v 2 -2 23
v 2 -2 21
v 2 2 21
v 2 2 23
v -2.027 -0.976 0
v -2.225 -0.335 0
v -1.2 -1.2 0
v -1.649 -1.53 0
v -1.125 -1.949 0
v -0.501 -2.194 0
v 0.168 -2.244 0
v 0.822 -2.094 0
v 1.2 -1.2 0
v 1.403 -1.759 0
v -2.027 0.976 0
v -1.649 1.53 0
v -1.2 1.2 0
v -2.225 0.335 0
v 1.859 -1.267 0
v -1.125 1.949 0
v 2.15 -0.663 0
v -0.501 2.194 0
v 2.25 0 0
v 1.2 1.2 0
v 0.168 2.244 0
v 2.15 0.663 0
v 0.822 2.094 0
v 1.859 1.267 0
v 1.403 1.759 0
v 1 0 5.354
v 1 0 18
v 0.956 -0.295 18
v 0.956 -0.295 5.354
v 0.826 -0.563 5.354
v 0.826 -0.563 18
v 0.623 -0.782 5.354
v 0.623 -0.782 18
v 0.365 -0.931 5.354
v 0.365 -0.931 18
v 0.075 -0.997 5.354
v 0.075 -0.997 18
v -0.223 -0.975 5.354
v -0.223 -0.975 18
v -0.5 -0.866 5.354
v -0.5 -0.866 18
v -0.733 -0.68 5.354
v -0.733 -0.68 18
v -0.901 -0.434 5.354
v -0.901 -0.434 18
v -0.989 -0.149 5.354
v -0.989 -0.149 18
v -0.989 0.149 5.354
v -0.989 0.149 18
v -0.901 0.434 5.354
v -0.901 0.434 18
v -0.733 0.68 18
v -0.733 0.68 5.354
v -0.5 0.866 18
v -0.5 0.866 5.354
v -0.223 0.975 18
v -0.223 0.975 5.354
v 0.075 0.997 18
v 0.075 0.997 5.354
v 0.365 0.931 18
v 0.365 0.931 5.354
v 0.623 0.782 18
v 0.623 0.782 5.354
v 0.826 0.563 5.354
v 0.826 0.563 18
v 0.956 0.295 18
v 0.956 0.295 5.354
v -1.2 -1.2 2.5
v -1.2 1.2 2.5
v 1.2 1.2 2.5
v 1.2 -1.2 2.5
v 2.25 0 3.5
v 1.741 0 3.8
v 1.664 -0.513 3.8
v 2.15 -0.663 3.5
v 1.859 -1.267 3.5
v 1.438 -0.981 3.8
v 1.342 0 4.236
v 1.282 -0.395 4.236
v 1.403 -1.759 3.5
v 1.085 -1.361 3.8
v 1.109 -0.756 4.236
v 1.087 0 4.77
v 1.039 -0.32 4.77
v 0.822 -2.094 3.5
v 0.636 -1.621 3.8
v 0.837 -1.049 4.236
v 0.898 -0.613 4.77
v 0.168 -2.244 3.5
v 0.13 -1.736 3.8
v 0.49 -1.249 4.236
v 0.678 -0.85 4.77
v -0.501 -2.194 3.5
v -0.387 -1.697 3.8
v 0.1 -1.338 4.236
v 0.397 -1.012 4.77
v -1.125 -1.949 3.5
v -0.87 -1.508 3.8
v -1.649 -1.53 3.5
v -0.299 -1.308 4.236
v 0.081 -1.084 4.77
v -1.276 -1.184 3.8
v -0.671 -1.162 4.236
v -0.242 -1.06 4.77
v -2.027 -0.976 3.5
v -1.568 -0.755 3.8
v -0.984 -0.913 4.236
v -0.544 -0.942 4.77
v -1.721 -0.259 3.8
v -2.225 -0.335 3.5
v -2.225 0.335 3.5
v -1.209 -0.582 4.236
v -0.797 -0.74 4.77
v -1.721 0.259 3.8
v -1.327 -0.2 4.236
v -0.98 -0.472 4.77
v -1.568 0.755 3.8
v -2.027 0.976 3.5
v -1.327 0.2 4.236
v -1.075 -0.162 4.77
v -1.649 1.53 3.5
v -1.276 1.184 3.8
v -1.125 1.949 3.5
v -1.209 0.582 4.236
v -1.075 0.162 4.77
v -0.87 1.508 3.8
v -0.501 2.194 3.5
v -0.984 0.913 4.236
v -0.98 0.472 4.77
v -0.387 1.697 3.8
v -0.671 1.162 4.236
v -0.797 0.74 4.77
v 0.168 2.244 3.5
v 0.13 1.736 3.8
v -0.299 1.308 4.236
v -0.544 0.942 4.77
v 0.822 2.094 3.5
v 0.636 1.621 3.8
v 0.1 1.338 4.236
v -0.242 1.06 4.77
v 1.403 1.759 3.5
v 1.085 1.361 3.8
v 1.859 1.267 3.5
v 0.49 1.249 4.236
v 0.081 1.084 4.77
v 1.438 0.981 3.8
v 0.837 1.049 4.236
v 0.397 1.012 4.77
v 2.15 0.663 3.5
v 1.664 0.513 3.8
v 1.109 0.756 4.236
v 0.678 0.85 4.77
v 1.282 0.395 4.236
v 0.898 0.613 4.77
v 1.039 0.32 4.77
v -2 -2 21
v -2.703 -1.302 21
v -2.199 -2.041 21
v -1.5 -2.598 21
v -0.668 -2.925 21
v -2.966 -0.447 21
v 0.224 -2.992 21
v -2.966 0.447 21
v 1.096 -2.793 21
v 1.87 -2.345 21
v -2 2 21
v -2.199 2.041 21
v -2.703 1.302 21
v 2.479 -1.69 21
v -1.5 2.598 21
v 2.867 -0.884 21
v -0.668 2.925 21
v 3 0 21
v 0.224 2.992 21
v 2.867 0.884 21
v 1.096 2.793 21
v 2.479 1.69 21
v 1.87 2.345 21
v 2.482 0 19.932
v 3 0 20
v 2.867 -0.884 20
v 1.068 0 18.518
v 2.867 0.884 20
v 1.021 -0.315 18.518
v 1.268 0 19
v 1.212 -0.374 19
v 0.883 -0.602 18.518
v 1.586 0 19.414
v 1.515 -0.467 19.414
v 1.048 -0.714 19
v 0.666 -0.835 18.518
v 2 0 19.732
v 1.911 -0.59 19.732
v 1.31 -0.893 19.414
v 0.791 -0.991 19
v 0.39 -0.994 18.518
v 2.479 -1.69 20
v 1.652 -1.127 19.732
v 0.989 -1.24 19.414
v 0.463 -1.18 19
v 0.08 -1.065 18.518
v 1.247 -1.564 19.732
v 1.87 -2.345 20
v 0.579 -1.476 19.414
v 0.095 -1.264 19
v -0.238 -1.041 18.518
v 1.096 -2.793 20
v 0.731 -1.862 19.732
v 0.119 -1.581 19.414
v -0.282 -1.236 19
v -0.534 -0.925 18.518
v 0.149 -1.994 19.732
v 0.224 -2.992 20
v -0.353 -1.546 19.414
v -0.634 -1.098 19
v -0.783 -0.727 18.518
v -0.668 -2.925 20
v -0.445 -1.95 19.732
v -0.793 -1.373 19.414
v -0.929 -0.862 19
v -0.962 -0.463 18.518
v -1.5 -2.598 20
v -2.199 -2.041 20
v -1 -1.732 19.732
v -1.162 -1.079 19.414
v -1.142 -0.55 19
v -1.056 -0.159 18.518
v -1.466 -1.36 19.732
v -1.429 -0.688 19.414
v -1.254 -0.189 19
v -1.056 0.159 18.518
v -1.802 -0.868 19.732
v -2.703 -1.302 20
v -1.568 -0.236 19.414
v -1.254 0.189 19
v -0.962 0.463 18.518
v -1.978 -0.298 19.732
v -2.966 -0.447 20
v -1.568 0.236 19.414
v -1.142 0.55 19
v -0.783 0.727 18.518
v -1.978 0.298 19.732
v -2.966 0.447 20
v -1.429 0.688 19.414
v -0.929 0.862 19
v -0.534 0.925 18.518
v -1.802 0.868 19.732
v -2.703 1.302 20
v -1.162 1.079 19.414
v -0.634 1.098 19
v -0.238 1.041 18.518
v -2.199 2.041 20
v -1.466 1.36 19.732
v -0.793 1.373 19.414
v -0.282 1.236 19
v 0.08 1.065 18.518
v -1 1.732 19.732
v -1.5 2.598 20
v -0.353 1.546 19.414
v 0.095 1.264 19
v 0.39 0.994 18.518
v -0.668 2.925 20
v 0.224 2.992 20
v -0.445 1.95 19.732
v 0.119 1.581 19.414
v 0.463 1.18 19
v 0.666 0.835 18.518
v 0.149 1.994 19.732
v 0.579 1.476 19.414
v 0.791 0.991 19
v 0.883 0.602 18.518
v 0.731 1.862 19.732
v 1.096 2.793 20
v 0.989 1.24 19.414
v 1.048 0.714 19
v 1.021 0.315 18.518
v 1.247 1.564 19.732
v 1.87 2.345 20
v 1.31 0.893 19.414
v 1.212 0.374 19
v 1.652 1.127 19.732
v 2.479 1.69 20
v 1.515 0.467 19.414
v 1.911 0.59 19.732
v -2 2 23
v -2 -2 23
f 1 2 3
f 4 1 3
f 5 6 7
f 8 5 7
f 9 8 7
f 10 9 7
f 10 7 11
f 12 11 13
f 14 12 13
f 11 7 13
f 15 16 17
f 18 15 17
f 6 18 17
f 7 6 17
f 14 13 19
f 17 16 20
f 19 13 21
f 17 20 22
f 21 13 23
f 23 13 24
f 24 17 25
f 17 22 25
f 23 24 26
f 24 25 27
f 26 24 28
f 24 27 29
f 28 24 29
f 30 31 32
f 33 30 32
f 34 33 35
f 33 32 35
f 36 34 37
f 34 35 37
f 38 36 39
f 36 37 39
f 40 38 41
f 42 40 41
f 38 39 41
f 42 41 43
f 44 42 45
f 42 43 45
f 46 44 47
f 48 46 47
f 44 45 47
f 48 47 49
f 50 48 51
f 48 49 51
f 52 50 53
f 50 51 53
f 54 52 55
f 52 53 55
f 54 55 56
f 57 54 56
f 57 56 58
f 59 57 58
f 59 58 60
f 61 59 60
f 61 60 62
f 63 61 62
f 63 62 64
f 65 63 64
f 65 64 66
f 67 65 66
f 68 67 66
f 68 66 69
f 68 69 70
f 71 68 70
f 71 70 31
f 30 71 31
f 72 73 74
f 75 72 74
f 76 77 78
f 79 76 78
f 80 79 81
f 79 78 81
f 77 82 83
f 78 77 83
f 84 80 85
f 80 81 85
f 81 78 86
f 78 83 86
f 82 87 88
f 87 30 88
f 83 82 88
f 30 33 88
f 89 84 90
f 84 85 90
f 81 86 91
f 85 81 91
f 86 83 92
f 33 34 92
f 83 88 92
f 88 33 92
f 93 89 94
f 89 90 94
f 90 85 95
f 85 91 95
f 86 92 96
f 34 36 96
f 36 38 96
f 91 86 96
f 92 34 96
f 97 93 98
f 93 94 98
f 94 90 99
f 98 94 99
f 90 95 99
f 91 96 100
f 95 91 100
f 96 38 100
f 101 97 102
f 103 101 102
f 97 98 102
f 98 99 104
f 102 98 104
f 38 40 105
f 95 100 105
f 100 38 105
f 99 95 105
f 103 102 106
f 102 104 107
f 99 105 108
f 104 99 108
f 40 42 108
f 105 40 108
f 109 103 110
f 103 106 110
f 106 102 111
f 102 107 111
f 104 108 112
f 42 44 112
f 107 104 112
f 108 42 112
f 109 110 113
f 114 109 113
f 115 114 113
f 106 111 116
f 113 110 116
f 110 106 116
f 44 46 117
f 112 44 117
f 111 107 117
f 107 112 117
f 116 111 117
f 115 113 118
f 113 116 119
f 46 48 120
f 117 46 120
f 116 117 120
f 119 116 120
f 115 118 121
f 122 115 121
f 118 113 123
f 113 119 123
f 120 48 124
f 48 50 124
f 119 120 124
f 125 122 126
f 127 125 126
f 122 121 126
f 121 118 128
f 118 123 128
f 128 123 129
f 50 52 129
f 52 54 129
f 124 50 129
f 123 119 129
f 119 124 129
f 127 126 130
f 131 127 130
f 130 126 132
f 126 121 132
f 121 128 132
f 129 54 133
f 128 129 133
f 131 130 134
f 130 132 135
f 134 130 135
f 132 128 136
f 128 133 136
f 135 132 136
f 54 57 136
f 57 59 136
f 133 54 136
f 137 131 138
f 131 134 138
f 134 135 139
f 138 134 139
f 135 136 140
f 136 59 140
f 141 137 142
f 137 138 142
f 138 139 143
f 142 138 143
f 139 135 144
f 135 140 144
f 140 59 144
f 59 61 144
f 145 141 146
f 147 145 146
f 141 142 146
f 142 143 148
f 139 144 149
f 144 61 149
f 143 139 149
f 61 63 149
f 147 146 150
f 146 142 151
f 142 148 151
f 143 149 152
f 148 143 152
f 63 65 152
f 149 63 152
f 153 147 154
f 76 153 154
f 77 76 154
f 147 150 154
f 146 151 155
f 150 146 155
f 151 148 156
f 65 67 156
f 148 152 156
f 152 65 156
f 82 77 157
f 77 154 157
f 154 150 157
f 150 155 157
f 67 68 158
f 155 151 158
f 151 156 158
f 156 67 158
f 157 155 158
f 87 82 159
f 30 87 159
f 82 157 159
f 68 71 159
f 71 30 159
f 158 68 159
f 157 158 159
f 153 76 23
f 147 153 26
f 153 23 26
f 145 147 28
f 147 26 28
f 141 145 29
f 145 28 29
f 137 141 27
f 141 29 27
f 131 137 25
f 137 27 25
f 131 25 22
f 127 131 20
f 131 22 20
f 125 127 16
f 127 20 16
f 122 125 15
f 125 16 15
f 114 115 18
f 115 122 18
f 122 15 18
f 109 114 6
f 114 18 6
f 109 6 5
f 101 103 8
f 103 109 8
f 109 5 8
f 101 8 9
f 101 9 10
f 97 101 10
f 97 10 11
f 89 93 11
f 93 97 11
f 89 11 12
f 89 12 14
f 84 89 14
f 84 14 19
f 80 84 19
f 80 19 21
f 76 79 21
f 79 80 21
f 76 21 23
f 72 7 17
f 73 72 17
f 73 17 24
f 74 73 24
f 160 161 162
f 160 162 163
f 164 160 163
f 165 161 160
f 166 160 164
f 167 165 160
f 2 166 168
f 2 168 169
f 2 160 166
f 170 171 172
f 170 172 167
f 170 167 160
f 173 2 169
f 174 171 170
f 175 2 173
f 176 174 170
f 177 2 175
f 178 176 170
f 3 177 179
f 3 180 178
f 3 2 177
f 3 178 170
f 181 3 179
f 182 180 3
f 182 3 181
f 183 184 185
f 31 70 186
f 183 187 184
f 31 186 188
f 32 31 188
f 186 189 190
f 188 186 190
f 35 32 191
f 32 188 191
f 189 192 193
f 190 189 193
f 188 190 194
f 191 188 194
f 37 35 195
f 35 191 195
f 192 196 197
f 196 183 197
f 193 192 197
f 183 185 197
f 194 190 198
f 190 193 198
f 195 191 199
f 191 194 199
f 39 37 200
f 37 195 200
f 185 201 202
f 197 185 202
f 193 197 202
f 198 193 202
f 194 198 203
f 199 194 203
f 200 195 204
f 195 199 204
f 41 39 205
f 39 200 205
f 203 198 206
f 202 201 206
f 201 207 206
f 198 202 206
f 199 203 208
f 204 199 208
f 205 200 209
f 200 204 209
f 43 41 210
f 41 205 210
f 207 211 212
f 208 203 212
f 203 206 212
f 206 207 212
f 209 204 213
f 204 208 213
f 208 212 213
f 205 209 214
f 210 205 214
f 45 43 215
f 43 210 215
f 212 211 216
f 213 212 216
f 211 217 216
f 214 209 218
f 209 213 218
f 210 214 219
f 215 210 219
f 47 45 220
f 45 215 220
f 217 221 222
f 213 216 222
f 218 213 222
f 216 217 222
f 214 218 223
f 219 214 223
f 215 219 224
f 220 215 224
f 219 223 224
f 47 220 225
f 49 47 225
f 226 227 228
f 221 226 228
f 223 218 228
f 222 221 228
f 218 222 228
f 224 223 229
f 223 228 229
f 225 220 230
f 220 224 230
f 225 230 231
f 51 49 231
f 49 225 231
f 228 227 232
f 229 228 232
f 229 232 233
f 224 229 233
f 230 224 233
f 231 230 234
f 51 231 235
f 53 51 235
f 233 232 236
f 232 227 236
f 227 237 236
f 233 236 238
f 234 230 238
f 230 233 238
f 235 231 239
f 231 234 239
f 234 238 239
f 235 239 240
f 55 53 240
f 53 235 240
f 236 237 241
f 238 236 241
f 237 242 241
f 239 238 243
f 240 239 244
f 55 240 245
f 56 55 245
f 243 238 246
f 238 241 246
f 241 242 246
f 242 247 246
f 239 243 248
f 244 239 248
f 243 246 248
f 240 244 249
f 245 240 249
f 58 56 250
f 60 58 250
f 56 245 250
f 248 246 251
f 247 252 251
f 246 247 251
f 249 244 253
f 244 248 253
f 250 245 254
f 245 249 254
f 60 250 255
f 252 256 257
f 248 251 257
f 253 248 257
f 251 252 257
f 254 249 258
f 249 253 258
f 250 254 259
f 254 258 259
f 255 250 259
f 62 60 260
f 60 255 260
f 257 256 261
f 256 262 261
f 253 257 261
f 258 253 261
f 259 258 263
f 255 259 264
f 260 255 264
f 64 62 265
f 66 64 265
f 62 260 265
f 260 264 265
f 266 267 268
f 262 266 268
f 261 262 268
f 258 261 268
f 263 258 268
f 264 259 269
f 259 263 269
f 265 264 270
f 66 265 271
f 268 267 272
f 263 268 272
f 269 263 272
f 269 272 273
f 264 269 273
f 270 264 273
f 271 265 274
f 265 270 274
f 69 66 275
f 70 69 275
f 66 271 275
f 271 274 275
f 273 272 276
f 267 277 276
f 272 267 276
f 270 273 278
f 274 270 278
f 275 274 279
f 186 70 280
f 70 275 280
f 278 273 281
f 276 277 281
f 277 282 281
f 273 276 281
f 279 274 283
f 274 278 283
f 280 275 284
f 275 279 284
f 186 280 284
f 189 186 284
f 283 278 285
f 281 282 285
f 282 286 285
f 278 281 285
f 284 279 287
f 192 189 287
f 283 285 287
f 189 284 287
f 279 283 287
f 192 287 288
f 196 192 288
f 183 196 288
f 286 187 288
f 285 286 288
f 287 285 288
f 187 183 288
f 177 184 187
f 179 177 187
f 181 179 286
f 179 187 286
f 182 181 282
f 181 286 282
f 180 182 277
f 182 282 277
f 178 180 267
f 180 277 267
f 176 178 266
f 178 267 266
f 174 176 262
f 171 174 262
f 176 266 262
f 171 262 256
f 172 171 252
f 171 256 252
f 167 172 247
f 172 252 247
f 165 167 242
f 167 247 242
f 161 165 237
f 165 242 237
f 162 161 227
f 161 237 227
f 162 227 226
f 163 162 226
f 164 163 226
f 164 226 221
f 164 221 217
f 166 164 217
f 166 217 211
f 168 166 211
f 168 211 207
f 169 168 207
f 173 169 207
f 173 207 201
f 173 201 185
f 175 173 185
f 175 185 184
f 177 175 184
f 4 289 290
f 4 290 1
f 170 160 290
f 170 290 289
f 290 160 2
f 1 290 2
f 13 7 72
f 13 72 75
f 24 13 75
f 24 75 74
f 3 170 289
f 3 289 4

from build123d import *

# Parameters (mm, degrees)
SKETCH_1_R          = 2.25
EXTRUDE_2_DEPTH     = 20
SKETCH_7_W          = 2.4
SKETCH_7_H          = 2.4
CUT_EXTRUDE_3_DEPTH = 2.5
SKETCH_9_R          = 3
EXTRUDE_4_DEPTH     = 1
SKETCH_10_W         = 4
SKETCH_10_H         = 4
EXTRUDE_5_DEPTH     = 2
CUT_EXTRUDE_START   = -20
SKETCH_12_OUTSIDE_W = 12.904
SKETCH_12_OUTSIDE_H = 12.904
SKETCH_12_OUTSIDE_R = 1
CUT_EXTRUDE_4_DEPTH = 16.5
FILLET_1_R          = 2


with BuildPart() as part:
    # 草图1 → 凸台-拉伸2 (new body)
    with BuildSketch(Plane.XY):
        Circle(SKETCH_1_R)
    extrude(amount=EXTRUDE_2_DEPTH)

    # 草图7 → 切除-拉伸3 (cut)
    with BuildSketch(Plane.XY):
        Rectangle(SKETCH_7_W, SKETCH_7_H)
    extrude(amount=CUT_EXTRUDE_3_DEPTH, mode=Mode.SUBTRACT)

    # 草图9 → 凸台-拉伸4 (add)
    with BuildSketch(Plane.XY.offset(20)):
        Circle(SKETCH_9_R)
    extrude(amount=EXTRUDE_4_DEPTH)

    # 草图10 → 凸台-拉伸5 (add)
    with BuildSketch(Plane.XY.offset(21)):
        Rectangle(SKETCH_10_W, SKETCH_10_H)
    extrude(amount=EXTRUDE_5_DEPTH)

    # 草图12 outside → 切除-拉伸4 (cut)
    with BuildSketch(Plane(origin=(0, 0, 0), x_dir=(-1, 0, 0), z_dir=(0, 0, -1)).offset(CUT_EXTRUDE_START)):
        Rectangle(SKETCH_12_OUTSIDE_W, SKETCH_12_OUTSIDE_H)
        with Locations(Location((0, 0, 0), (0, 0, 180))):
            Circle(SKETCH_12_OUTSIDE_R, mode=Mode.SUBTRACT)
    extrude(amount=CUT_EXTRUDE_4_DEPTH, mode=Mode.SUBTRACT)

    # 圆角1
    # the kernel refuses this fillet: 2 mm, written as the material it adds along each edge
    with BuildSketch(Plane(origin=(0, 0, 3.5), x_dir=(1, 0, 0), z_dir=(0, 1, 0))) as fillet_1_piece_1:
        with BuildLine():
            CenterArc((3, -1.854049622), FILLET_1_R, 112.024312837, 67.975687163)
            Line((2.25, 0), (2.235, 0.037080992))
            ThreePointArc((2.235, 0.037080992), (1.625, 0.04), (1, 0.04))
            Line((1, 0.04), (0.96, 0))
            Line((0.96, 0), (0.96, -1.854049622))
            Line((0.96, -1.854049622), (1, -1.854049622))
        make_face()
    revolve(axis=Axis((0, 0, 3.5), (0, 0, -1)))
    with BuildSketch(Plane(origin=(0, 0, 20), x_dir=(1, 0, 0), z_dir=(0, 1, 0))) as fillet_1_piece_2:
        with BuildLine():
            CenterArc((1 + FILLET_1_R, FILLET_1_R), FILLET_1_R, 180, 90)
            Line((1, FILLET_1_R), (1 - FILLET_1_R * 0.02, FILLET_1_R))
            Line((1 - FILLET_1_R * 0.02, FILLET_1_R), (1 - FILLET_1_R * 0.02, -FILLET_1_R * 0.02))
            Line((1 - FILLET_1_R * 0.02, -FILLET_1_R * 0.02), (1 + FILLET_1_R, -FILLET_1_R * 0.02))
            Line((1 + FILLET_1_R, -FILLET_1_R * 0.02), (1 + FILLET_1_R, 0))
        make_face()
    revolve(axis=Axis((0, 0, 20), (0, 0, -1)))


solid = part.part
